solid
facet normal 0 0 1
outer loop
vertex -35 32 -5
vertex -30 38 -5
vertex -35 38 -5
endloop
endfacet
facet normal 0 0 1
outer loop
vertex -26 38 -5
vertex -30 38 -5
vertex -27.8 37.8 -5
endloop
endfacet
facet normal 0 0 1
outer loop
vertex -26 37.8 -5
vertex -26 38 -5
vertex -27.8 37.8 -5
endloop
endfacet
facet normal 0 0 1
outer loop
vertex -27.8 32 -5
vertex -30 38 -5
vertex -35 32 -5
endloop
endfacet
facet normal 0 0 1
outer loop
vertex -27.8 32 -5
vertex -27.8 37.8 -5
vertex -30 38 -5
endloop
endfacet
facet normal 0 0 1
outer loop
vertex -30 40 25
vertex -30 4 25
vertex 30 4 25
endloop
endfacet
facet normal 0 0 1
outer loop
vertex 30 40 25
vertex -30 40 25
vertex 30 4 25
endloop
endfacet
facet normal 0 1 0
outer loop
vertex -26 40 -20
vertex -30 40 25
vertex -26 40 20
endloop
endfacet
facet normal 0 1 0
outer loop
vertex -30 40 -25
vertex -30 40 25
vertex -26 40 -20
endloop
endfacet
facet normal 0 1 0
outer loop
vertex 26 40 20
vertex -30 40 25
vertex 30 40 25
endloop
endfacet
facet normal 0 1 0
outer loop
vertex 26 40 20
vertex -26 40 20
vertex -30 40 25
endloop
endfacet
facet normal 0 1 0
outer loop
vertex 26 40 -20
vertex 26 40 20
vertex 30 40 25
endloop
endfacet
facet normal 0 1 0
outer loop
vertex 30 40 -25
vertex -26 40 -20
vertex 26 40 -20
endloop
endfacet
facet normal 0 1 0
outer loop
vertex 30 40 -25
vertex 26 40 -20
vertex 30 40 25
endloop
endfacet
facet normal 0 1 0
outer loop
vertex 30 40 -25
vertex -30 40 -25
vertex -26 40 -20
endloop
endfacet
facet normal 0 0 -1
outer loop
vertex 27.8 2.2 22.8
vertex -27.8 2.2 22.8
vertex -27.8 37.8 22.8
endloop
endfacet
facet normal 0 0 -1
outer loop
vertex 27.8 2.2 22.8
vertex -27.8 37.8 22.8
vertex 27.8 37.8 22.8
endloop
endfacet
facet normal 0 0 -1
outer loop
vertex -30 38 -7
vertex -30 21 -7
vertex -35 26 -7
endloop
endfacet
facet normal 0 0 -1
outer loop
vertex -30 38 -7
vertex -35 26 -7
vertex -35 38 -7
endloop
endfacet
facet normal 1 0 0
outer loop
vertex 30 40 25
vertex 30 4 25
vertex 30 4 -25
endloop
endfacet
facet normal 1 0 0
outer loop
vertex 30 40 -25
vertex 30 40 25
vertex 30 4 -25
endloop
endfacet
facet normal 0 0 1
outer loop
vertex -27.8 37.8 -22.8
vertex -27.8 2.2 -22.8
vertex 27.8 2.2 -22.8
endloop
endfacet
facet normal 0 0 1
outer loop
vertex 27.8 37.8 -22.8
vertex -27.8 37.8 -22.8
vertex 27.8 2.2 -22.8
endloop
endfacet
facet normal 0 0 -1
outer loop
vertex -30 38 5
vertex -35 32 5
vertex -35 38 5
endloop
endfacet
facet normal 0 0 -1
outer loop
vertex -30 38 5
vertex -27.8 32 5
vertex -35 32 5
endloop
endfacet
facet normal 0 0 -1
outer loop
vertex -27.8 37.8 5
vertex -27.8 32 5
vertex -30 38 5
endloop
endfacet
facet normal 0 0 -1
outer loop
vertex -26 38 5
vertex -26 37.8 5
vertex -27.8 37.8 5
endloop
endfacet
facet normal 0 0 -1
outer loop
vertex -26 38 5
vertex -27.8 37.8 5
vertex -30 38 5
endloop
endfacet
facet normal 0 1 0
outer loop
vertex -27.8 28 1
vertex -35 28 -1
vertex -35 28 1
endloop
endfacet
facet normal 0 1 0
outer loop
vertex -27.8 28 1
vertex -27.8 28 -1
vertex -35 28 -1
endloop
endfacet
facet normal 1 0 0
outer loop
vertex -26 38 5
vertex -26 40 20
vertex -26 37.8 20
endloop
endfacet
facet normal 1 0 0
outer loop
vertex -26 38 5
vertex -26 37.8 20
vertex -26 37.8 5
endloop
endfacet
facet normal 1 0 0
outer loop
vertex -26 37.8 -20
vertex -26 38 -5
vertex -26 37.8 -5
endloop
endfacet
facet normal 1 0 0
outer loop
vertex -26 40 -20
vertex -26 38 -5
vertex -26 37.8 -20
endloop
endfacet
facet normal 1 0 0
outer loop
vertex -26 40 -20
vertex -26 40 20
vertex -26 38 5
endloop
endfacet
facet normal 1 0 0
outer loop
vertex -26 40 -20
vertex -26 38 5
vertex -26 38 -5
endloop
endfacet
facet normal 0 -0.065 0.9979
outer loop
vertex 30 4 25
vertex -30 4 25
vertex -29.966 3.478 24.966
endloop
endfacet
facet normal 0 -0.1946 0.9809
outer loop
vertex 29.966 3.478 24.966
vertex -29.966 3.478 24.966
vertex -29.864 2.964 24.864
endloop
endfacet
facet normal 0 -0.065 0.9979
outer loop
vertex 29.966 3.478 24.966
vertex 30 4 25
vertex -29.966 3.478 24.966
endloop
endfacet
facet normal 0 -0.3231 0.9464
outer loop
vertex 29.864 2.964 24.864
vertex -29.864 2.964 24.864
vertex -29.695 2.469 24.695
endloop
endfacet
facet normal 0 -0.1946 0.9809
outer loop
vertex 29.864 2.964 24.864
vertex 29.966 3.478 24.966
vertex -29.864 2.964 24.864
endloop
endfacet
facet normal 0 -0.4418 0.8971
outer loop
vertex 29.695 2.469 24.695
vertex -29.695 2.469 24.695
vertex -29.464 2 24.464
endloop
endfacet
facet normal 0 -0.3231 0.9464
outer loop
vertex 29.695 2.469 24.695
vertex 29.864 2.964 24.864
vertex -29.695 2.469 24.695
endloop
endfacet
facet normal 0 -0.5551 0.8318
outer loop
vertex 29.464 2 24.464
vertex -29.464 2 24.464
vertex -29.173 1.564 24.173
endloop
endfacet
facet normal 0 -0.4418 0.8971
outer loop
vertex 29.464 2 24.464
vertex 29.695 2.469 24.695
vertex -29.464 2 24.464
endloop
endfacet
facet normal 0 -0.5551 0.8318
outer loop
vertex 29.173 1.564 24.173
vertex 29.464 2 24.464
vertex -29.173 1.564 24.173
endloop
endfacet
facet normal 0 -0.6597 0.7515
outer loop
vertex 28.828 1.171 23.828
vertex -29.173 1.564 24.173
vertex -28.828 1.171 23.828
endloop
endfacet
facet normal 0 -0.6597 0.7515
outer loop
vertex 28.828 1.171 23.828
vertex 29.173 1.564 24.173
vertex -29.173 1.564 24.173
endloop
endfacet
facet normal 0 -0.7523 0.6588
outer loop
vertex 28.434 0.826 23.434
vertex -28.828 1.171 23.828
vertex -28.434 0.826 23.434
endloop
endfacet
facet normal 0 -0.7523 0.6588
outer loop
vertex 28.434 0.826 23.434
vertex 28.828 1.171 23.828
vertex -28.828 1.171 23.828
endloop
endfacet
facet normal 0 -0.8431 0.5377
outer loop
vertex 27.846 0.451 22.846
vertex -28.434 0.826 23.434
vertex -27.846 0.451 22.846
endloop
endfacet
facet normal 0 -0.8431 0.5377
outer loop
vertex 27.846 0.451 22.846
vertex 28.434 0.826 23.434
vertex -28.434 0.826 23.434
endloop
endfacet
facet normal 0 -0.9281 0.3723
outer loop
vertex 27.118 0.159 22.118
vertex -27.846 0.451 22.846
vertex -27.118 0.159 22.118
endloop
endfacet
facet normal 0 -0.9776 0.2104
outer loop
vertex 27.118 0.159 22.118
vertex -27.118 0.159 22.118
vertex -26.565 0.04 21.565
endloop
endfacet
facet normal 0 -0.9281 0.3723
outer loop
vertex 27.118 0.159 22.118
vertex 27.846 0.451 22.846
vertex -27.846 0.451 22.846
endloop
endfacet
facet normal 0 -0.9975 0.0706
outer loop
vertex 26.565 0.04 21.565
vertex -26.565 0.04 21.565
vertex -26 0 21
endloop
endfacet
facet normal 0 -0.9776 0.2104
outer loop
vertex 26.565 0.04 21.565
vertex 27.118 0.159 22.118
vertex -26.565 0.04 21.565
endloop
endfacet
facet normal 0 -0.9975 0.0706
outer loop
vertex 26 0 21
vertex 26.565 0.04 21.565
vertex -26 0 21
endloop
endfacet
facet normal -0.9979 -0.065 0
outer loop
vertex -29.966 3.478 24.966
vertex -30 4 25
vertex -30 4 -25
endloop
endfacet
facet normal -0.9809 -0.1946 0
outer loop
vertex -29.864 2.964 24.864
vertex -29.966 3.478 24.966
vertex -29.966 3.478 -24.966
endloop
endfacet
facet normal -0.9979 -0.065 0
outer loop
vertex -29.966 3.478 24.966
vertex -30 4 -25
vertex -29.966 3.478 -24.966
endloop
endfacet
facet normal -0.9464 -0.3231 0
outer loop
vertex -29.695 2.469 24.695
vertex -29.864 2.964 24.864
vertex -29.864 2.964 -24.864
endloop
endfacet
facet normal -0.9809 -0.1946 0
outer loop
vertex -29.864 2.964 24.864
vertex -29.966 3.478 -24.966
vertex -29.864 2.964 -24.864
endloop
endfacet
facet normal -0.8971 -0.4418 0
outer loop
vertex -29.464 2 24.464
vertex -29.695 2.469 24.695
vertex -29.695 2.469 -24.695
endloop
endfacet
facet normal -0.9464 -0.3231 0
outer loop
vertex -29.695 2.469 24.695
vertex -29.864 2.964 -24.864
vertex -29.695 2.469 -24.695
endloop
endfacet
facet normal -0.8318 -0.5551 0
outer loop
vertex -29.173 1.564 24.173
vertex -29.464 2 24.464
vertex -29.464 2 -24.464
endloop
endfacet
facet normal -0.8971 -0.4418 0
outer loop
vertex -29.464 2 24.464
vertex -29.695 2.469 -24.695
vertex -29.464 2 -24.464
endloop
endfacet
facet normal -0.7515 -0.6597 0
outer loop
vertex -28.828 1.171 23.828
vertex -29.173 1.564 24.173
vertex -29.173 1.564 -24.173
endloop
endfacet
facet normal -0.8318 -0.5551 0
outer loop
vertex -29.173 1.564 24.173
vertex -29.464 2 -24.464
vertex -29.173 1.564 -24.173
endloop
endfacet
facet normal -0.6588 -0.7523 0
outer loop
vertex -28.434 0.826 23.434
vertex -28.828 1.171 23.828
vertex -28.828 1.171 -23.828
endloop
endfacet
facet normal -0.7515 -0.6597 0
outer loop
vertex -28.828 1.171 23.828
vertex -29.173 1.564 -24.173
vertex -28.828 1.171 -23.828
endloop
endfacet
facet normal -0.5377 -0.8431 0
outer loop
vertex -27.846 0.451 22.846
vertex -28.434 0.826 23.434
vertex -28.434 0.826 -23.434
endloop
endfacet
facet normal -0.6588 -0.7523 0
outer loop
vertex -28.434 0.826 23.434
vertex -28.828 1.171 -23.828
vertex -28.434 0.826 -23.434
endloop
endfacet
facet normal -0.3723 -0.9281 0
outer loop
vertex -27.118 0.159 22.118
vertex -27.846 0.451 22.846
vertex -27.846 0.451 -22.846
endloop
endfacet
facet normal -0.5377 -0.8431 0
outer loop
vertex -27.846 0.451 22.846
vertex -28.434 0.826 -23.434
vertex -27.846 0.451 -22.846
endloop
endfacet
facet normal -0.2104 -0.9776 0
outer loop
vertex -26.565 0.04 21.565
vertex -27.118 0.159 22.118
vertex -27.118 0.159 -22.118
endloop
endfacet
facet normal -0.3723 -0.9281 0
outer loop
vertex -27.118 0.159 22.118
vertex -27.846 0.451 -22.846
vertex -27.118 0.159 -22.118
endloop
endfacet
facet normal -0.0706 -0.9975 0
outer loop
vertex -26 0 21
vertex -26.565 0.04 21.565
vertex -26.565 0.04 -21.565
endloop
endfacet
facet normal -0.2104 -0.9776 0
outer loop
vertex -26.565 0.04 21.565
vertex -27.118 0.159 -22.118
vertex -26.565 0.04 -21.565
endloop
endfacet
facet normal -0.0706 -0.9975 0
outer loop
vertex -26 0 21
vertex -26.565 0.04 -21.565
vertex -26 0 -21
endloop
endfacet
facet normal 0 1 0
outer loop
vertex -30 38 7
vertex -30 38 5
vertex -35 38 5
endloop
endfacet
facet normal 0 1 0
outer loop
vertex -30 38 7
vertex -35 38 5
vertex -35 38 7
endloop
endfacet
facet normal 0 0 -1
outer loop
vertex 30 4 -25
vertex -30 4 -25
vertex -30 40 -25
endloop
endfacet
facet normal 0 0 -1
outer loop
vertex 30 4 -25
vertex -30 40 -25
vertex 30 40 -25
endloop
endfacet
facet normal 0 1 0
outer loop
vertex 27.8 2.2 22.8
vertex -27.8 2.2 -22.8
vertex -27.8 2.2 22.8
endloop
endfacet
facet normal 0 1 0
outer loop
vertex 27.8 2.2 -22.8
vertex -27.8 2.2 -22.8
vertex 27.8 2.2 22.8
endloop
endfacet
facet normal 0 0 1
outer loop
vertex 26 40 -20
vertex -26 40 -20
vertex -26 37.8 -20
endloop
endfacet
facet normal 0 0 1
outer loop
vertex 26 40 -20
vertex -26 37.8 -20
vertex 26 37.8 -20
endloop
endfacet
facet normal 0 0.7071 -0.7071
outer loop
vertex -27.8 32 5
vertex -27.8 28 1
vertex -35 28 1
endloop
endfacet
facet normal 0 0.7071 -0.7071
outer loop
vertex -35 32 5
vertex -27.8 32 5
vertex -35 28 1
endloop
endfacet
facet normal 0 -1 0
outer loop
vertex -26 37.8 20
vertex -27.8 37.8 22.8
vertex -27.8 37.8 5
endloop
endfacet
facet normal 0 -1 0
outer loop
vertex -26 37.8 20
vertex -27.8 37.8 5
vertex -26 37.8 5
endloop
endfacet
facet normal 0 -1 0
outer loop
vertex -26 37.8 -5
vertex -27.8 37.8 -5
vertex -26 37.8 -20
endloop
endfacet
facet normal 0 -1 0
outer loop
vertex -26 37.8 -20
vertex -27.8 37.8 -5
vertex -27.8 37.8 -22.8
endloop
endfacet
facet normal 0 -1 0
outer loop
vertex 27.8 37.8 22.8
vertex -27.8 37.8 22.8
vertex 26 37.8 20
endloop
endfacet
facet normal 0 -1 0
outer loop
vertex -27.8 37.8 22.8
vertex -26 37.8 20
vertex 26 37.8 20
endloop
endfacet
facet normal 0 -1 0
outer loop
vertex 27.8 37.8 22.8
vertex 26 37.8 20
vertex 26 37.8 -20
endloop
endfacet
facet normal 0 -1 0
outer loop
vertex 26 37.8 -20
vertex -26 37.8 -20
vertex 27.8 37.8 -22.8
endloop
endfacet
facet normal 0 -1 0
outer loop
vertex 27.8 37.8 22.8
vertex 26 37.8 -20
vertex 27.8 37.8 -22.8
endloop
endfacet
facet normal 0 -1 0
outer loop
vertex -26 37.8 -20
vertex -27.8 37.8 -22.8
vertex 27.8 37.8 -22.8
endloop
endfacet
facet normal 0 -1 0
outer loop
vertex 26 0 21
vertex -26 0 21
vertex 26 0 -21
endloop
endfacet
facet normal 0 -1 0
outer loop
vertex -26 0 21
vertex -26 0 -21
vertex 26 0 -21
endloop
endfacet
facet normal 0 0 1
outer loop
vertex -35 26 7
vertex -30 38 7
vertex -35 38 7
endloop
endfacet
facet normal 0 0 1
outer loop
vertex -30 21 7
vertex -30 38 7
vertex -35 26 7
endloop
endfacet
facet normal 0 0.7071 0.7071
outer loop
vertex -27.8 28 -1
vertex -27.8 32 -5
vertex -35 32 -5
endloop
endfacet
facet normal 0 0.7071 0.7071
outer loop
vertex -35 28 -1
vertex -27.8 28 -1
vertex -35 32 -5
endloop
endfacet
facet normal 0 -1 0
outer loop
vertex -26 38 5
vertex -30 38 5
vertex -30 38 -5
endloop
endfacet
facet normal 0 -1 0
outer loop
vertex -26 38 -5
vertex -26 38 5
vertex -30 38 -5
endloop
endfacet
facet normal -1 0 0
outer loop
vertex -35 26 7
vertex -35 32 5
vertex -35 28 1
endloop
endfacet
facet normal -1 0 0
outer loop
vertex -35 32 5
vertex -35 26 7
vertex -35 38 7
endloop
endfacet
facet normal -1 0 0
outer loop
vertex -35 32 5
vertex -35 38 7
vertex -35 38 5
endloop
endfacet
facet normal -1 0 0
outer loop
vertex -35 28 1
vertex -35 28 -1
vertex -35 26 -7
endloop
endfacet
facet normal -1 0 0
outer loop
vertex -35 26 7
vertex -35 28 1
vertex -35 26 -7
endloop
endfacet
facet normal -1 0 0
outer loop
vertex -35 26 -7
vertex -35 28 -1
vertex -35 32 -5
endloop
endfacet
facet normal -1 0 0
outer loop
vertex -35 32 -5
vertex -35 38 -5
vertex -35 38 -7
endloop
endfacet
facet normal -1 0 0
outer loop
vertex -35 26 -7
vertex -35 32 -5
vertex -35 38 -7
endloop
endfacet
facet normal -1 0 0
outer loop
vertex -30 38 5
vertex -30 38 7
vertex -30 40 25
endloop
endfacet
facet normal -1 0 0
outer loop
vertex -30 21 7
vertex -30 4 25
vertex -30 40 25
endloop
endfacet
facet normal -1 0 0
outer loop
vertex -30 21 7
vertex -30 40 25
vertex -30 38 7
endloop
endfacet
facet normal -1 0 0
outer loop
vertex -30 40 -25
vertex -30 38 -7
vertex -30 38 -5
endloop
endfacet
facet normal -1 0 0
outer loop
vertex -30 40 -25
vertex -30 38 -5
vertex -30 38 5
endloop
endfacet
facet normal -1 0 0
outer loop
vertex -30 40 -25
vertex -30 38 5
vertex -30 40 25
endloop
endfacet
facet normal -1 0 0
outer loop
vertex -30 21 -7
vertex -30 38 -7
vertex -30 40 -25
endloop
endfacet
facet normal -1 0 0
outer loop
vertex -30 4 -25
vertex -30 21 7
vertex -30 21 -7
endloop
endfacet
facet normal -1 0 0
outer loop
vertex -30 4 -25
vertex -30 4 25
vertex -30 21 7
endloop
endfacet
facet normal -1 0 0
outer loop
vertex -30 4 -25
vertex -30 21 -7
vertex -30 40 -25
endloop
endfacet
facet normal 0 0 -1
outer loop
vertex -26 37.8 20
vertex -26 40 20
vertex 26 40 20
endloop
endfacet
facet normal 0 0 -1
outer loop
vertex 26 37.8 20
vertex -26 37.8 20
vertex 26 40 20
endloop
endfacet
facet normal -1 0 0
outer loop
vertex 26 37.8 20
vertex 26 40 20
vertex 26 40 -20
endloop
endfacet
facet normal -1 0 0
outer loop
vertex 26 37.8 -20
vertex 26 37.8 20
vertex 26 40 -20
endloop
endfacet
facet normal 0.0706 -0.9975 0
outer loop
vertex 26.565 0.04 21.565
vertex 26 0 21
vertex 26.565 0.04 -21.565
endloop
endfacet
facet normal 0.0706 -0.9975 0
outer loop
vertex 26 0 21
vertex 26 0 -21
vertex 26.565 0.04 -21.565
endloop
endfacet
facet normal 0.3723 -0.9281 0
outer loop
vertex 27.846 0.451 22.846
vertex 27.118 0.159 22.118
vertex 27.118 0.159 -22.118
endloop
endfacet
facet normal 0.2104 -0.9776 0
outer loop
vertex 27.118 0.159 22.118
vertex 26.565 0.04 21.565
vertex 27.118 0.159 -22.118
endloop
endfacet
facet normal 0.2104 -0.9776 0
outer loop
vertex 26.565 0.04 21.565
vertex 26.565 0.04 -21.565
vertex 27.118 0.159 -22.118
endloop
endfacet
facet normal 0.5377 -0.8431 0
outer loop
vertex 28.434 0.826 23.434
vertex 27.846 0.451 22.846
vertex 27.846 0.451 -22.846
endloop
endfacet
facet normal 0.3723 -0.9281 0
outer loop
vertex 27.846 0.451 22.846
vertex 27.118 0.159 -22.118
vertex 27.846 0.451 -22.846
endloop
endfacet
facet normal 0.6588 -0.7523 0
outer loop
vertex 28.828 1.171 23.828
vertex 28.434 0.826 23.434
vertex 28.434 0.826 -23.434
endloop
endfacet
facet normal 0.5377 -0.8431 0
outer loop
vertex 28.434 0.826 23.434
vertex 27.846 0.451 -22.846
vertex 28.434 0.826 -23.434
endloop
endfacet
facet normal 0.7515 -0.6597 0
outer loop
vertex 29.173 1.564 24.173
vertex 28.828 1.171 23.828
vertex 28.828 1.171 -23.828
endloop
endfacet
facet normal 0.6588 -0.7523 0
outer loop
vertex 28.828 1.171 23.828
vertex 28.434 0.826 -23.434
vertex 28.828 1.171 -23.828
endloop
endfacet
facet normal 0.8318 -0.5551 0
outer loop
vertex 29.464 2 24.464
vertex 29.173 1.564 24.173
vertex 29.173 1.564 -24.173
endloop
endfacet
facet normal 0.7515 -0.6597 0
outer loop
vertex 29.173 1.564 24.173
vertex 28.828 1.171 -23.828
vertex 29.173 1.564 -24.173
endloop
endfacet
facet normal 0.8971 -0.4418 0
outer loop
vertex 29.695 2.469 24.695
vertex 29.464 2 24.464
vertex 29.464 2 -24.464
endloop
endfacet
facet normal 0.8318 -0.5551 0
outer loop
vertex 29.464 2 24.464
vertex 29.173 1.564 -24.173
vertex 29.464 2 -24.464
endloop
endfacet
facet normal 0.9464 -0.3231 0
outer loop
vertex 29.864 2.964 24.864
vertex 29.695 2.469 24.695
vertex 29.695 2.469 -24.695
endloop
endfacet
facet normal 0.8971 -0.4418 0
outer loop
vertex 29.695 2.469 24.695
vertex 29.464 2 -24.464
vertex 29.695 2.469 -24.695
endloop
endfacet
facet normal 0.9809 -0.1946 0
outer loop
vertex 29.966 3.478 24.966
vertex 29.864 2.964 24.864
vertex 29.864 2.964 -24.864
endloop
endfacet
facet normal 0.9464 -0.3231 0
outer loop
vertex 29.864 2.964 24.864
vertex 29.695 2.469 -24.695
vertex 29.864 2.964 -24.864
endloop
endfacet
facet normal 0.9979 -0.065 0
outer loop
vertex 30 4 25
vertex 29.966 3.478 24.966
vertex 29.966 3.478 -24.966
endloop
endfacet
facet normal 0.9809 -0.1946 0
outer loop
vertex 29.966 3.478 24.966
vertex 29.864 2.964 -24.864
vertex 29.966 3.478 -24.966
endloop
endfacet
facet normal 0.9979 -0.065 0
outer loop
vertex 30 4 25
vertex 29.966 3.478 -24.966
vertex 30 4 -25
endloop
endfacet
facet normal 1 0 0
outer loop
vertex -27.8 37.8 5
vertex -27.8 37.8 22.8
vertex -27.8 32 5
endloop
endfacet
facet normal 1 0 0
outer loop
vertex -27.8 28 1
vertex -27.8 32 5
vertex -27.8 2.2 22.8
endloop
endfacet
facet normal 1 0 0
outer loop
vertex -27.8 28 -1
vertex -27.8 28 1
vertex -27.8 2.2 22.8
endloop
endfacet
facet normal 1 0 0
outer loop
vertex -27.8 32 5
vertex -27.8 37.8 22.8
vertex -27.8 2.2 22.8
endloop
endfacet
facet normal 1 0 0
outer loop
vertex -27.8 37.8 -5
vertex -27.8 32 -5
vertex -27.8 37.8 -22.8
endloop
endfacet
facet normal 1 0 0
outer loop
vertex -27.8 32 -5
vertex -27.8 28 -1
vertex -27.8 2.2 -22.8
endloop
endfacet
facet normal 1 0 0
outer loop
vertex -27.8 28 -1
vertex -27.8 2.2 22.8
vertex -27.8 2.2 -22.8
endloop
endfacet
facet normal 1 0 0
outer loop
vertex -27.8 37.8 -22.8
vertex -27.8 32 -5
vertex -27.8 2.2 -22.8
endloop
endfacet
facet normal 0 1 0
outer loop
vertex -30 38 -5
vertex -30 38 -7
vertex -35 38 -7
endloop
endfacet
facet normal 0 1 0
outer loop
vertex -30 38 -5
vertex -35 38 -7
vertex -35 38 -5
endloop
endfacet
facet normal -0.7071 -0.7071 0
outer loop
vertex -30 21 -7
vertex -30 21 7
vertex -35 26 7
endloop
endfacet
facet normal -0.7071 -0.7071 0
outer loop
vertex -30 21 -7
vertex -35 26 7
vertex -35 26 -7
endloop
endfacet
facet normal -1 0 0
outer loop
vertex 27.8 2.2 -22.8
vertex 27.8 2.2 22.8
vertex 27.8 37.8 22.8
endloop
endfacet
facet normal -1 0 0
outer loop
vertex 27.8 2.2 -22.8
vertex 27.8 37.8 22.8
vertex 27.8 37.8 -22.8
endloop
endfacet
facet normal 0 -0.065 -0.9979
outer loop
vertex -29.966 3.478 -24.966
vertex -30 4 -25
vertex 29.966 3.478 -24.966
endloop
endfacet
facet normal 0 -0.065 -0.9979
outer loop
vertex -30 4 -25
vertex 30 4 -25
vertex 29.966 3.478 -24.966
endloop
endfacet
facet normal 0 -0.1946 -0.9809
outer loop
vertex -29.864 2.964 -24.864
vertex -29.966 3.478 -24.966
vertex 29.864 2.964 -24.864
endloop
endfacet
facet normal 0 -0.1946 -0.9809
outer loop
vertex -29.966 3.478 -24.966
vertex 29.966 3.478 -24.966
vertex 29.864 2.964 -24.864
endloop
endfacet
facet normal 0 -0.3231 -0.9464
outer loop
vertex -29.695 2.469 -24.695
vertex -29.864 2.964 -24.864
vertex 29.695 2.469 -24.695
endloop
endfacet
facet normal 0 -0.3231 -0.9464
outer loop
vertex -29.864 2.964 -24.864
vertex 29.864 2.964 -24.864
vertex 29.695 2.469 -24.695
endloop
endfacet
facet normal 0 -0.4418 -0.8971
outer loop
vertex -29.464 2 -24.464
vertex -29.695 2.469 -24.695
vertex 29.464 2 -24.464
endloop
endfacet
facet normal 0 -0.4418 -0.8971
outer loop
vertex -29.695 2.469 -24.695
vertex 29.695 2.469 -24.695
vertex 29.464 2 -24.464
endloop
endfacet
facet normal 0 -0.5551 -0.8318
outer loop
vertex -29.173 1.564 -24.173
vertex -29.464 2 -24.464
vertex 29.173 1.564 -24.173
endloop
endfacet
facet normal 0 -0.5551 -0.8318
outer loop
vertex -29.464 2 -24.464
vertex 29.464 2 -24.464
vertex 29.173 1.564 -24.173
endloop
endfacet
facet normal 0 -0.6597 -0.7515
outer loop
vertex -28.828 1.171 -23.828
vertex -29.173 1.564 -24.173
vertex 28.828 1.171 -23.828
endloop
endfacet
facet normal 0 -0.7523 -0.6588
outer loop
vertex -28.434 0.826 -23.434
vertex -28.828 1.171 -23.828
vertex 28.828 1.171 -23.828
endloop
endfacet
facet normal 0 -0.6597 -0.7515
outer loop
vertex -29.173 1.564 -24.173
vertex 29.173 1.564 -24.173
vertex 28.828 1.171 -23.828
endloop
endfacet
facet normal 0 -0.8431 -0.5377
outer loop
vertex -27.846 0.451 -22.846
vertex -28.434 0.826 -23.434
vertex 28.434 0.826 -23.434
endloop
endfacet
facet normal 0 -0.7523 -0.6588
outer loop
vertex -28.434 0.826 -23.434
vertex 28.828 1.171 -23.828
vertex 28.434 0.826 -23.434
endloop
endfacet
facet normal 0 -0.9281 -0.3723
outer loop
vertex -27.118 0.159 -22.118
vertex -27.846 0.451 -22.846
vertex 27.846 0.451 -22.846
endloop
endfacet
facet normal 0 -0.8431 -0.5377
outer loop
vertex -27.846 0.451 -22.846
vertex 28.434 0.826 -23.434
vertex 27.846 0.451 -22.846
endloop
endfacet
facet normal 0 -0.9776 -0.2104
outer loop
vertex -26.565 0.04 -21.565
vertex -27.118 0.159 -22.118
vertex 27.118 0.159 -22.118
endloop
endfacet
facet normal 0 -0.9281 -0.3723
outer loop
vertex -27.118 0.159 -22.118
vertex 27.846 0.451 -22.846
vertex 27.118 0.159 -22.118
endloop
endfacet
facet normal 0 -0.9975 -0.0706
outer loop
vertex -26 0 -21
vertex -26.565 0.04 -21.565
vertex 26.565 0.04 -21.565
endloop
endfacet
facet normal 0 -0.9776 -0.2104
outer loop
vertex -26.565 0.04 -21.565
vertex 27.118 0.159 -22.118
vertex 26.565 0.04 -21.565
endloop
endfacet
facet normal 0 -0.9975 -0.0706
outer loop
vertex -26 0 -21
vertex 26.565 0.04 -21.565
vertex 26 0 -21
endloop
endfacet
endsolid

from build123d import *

# Parameters (mm, degrees)
SKETCH1_W           = 60
SKETCH1_H           = 50
BOSS_EXTRUDE1_DEPTH = 40
SHELL1_T            = 2.2
SKETCH2_W           = 52
SKETCH2_H           = 40
CUT_EXTRUDE1_DEPTH  = 10
SKETCH3_W           = 10
SKETCH3_H           = 10
CUT_EXTRUDE2_DEPTH  = 5
BOSS_EXTRUDE2_DEPTH = 5
CHAMFER3_SIZE       = 5
CHAMFER4_SIZE       = 4
FILLET1_R           = 4


with BuildPart() as part:
    # Sketch1 → Boss-Extrude1 (new body)
    with BuildSketch(Plane(origin=(0, 0, 0), x_dir=(1, 0, 0), z_dir=(0, 1, 0))):
        Rectangle(SKETCH1_W, SKETCH1_H)
    extrude(amount=BOSS_EXTRUDE1_DEPTH)

    # Shell1 (no face opened: a closed hollow body)
    add(offset(amount=-SHELL1_T, mode=Mode.PRIVATE), mode=Mode.SUBTRACT)

    # Sketch2 → Cut-Extrude1 (cut)
    with BuildSketch(Plane(origin=(0, 40, 0), x_dir=(1, 0, 0), z_dir=(0, 1, 0))):
        Rectangle(SKETCH2_W, SKETCH2_H)
    extrude(amount=-CUT_EXTRUDE1_DEPTH, mode=Mode.SUBTRACT)

    # Sketch3 → Cut-Extrude2 (cut)
    with BuildSketch(Plane(origin=(-30, 0, 0), x_dir=(0, 0, -1), z_dir=(1, 0, 0))):
        with Locations((0, 33)):
            Rectangle(SKETCH3_W, SKETCH3_H)
    extrude(amount=CUT_EXTRUDE2_DEPTH, mode=Mode.SUBTRACT)

    # Sketch4 → Boss-Extrude2 (add)
    with BuildSketch(Plane(origin=(-30, 0, 0), x_dir=(0, 0, -1), z_dir=(1, 0, 0))):
        Polygon((-5, 38), (-7, 38), (-7, 26), (7, 26), (7, 38), (5, 38), (5, 28), (-5, 28), align=None)
    extrude(amount=-BOSS_EXTRUDE2_DEPTH)

    # Chamfer3
    chamfer3_edges = [part.edges().sort_by_distance(p)[0] for p in [
        (-30, 26, 0),
    ]]
    chamfer(chamfer3_edges, length=CHAMFER3_SIZE - 0.0001)  # a hair under: the kernel refuses the full size

    # Chamfer4
    chamfer4_edges = [part.edges().sort_by_distance(p)[0] for p in [
        (-31.4, 28, 5),
        (-31.4, 28, -5),
    ]]
    chamfer(chamfer4_edges, length=CHAMFER4_SIZE)

    # Fillet1
    fillet1_edges = [part.edges().sort_by_distance(p)[0] for p in [
        (0, 0, 25),
        (-30, 0, 0),
        (0, 0, -25),
        (30, 0, 0),
    ]]
    fillet(fillet1_edges, radius=FILLET1_R)


solid = part.part
